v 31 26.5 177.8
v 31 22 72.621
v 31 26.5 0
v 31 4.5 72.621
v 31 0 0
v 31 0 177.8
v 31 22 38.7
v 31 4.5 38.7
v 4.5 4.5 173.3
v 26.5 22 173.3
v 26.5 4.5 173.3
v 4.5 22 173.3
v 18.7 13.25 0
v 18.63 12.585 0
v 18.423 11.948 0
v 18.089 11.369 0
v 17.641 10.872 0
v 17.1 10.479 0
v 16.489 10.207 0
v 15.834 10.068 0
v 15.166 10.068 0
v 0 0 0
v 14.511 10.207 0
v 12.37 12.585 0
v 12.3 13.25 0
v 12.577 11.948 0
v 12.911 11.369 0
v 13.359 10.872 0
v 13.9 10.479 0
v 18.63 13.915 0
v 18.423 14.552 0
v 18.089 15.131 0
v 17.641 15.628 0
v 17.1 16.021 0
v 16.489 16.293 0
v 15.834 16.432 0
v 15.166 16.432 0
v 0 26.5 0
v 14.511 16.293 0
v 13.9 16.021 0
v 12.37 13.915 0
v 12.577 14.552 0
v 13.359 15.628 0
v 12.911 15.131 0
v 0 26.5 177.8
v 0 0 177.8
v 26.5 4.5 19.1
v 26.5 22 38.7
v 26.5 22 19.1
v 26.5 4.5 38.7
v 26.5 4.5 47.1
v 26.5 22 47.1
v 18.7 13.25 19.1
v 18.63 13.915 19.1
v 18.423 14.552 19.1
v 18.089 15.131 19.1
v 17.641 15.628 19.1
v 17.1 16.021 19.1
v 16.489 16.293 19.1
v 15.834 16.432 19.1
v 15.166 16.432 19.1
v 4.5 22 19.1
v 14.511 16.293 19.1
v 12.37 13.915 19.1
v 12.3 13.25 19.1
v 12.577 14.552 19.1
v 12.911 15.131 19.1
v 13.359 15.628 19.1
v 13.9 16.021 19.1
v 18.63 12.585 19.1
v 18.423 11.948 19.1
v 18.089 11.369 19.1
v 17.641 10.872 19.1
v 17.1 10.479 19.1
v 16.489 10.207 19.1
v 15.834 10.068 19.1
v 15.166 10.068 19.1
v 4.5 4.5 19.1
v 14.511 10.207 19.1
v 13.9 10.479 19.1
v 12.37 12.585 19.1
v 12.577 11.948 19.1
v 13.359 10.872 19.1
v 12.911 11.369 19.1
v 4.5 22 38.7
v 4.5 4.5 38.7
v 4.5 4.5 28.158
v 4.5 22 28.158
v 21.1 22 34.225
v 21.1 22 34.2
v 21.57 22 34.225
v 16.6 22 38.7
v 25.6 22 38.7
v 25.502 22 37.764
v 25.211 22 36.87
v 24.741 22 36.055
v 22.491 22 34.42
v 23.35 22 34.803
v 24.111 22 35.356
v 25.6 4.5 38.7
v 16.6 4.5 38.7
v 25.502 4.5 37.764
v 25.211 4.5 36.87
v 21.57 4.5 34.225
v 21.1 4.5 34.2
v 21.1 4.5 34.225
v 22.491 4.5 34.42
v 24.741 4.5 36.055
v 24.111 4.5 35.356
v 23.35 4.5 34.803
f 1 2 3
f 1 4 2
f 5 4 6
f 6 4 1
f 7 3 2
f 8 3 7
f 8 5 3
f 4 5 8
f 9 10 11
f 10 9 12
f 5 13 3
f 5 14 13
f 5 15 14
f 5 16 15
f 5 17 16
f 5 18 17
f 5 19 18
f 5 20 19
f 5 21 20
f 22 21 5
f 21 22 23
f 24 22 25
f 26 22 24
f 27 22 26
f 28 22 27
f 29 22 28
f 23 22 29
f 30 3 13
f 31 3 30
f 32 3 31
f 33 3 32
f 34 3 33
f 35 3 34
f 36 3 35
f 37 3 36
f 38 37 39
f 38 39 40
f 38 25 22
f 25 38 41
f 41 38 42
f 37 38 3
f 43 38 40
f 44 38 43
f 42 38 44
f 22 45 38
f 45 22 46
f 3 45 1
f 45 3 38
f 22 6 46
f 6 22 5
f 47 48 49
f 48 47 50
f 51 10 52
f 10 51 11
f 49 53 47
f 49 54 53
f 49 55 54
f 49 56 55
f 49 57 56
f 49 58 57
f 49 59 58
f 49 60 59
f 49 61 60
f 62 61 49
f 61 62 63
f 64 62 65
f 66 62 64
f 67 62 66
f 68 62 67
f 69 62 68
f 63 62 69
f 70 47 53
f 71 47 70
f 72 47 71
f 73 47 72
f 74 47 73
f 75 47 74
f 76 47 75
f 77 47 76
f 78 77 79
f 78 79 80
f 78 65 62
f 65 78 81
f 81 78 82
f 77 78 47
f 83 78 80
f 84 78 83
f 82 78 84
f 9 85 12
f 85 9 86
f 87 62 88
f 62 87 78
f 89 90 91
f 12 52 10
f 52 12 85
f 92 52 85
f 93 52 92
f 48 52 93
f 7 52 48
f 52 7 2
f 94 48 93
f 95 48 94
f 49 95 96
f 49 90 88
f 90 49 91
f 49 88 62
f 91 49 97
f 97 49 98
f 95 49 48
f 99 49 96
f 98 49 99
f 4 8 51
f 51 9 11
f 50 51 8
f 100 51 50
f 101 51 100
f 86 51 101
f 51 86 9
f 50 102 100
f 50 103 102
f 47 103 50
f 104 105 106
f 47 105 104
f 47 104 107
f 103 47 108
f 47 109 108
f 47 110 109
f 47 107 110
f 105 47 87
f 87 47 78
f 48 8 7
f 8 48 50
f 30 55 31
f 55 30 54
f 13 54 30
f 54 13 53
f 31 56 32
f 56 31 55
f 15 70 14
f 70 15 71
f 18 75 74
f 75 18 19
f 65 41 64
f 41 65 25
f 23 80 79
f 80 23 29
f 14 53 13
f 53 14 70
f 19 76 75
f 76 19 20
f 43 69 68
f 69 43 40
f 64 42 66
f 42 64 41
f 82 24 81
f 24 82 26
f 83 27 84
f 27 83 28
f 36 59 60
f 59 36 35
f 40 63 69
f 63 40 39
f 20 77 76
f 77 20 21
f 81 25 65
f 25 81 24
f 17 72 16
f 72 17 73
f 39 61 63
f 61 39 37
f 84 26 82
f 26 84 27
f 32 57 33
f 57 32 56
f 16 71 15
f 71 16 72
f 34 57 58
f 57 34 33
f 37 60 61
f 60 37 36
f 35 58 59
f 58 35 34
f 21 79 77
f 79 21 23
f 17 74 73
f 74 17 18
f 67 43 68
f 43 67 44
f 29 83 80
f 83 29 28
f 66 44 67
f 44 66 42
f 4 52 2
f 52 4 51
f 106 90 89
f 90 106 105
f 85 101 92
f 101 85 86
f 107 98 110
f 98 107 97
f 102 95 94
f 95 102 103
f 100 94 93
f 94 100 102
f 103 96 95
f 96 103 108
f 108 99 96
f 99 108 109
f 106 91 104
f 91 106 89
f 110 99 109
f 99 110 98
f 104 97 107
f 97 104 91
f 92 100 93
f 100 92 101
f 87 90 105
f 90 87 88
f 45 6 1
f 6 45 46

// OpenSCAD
wall_thickness=4.5; //[0: 0.001 :10]
cap_height=38.7; //[0: 0.001 :100]
bottom_thickness=19.1; //[0: 0.01 :50]
windsheet_thickness=0.9; //[0: 0.001 :5]
mouth_height=8.4; //[0: 0.001 :50]
pipe_size=6.4;  //[0: 0.001 :20]
internal_width=17.5; //[0: 0.001 :100]
internal_depth=22.0; //[0: 0.001 :100]
internal_height=134.6; //[0: 0.001 :1000]
mouth_angle=10;  //[0: 0.1 :90]
windsheet_angle=20;  //[0: 0.1 :50]
capped="Yes"; //[Yes, No]

module pipe(wall_thickness, cap_height, bottom_thickness, windsheet_thickness, mouth_height, pipe_size, internal_width, internal_depth, internal_height, mouth_angle, windsheet_angle,capped);
    
    difference(){
        cube([(internal_depth+(2*wall_thickness)), (internal_width+(2*wall_thickness)), (internal_height+cap_height)]);
        translate([wall_thickness, wall_thickness, bottom_thickness]){
            cube([internal_depth, internal_width, (internal_height+cap_height-bottom_thickness+1)]);
        }
        translate([wall_thickness, wall_thickness, cap_height]){
            cube([(internal_depth+wall_thickness+1), internal_width, mouth_height]);
        }
        translate([((internal_depth+(2*wall_thickness))/2), ((internal_width+(2*wall_thickness))/2), -1]){
            cylinder(h=bottom_thickness+2, d=pipe_size, $fn=30);
        }
    translate([(internal_depth+wall_thickness), wall_thickness, (cap_height+mouth_height)]){
        rotate([0, mouth_angle, 0]){
            cube([wall_thickness, internal_width, internal_height]);
            }
        }
    }
    
    difference(){
        union(){
            translate([wall_thickness, wall_thickness, bottom_thickness]){
                cube([(internal_depth-windsheet_thickness-wall_thickness), internal_width, (cap_height-bottom_thickness)]);
            }
            translate([(internal_depth-windsheet_thickness), wall_thickness, cap_height]){
                rotate(a=-90, v=[1, 0, 0]){
                    cylinder(h=internal_width, r=wall_thickness, $fn=30);
                }
            }
        }
        translate([(internal_depth-wall_thickness-windsheet_thickness), wall_thickness-1, cap_height]){
            cube([(2*wall_thickness), internal_width+2, mouth_height]);
        }
        translate([(internal_depth-windsheet_thickness), wall_thickness-1, (cap_height-wall_thickness)]){
            rotate(a=-windsheet_angle-180, v=[0, 1, 0]){
                cube([internal_depth, internal_width+2, cap_height]);
            }
        }
    }
    
    if(capped=="Yes"){
        translate([0, 0, (internal_height+cap_height)]){
            cube([(internal_depth+(2*wall_thickness)), (internal_width+(2*wall_thickness)), wall_thickness]);
        }
    }
